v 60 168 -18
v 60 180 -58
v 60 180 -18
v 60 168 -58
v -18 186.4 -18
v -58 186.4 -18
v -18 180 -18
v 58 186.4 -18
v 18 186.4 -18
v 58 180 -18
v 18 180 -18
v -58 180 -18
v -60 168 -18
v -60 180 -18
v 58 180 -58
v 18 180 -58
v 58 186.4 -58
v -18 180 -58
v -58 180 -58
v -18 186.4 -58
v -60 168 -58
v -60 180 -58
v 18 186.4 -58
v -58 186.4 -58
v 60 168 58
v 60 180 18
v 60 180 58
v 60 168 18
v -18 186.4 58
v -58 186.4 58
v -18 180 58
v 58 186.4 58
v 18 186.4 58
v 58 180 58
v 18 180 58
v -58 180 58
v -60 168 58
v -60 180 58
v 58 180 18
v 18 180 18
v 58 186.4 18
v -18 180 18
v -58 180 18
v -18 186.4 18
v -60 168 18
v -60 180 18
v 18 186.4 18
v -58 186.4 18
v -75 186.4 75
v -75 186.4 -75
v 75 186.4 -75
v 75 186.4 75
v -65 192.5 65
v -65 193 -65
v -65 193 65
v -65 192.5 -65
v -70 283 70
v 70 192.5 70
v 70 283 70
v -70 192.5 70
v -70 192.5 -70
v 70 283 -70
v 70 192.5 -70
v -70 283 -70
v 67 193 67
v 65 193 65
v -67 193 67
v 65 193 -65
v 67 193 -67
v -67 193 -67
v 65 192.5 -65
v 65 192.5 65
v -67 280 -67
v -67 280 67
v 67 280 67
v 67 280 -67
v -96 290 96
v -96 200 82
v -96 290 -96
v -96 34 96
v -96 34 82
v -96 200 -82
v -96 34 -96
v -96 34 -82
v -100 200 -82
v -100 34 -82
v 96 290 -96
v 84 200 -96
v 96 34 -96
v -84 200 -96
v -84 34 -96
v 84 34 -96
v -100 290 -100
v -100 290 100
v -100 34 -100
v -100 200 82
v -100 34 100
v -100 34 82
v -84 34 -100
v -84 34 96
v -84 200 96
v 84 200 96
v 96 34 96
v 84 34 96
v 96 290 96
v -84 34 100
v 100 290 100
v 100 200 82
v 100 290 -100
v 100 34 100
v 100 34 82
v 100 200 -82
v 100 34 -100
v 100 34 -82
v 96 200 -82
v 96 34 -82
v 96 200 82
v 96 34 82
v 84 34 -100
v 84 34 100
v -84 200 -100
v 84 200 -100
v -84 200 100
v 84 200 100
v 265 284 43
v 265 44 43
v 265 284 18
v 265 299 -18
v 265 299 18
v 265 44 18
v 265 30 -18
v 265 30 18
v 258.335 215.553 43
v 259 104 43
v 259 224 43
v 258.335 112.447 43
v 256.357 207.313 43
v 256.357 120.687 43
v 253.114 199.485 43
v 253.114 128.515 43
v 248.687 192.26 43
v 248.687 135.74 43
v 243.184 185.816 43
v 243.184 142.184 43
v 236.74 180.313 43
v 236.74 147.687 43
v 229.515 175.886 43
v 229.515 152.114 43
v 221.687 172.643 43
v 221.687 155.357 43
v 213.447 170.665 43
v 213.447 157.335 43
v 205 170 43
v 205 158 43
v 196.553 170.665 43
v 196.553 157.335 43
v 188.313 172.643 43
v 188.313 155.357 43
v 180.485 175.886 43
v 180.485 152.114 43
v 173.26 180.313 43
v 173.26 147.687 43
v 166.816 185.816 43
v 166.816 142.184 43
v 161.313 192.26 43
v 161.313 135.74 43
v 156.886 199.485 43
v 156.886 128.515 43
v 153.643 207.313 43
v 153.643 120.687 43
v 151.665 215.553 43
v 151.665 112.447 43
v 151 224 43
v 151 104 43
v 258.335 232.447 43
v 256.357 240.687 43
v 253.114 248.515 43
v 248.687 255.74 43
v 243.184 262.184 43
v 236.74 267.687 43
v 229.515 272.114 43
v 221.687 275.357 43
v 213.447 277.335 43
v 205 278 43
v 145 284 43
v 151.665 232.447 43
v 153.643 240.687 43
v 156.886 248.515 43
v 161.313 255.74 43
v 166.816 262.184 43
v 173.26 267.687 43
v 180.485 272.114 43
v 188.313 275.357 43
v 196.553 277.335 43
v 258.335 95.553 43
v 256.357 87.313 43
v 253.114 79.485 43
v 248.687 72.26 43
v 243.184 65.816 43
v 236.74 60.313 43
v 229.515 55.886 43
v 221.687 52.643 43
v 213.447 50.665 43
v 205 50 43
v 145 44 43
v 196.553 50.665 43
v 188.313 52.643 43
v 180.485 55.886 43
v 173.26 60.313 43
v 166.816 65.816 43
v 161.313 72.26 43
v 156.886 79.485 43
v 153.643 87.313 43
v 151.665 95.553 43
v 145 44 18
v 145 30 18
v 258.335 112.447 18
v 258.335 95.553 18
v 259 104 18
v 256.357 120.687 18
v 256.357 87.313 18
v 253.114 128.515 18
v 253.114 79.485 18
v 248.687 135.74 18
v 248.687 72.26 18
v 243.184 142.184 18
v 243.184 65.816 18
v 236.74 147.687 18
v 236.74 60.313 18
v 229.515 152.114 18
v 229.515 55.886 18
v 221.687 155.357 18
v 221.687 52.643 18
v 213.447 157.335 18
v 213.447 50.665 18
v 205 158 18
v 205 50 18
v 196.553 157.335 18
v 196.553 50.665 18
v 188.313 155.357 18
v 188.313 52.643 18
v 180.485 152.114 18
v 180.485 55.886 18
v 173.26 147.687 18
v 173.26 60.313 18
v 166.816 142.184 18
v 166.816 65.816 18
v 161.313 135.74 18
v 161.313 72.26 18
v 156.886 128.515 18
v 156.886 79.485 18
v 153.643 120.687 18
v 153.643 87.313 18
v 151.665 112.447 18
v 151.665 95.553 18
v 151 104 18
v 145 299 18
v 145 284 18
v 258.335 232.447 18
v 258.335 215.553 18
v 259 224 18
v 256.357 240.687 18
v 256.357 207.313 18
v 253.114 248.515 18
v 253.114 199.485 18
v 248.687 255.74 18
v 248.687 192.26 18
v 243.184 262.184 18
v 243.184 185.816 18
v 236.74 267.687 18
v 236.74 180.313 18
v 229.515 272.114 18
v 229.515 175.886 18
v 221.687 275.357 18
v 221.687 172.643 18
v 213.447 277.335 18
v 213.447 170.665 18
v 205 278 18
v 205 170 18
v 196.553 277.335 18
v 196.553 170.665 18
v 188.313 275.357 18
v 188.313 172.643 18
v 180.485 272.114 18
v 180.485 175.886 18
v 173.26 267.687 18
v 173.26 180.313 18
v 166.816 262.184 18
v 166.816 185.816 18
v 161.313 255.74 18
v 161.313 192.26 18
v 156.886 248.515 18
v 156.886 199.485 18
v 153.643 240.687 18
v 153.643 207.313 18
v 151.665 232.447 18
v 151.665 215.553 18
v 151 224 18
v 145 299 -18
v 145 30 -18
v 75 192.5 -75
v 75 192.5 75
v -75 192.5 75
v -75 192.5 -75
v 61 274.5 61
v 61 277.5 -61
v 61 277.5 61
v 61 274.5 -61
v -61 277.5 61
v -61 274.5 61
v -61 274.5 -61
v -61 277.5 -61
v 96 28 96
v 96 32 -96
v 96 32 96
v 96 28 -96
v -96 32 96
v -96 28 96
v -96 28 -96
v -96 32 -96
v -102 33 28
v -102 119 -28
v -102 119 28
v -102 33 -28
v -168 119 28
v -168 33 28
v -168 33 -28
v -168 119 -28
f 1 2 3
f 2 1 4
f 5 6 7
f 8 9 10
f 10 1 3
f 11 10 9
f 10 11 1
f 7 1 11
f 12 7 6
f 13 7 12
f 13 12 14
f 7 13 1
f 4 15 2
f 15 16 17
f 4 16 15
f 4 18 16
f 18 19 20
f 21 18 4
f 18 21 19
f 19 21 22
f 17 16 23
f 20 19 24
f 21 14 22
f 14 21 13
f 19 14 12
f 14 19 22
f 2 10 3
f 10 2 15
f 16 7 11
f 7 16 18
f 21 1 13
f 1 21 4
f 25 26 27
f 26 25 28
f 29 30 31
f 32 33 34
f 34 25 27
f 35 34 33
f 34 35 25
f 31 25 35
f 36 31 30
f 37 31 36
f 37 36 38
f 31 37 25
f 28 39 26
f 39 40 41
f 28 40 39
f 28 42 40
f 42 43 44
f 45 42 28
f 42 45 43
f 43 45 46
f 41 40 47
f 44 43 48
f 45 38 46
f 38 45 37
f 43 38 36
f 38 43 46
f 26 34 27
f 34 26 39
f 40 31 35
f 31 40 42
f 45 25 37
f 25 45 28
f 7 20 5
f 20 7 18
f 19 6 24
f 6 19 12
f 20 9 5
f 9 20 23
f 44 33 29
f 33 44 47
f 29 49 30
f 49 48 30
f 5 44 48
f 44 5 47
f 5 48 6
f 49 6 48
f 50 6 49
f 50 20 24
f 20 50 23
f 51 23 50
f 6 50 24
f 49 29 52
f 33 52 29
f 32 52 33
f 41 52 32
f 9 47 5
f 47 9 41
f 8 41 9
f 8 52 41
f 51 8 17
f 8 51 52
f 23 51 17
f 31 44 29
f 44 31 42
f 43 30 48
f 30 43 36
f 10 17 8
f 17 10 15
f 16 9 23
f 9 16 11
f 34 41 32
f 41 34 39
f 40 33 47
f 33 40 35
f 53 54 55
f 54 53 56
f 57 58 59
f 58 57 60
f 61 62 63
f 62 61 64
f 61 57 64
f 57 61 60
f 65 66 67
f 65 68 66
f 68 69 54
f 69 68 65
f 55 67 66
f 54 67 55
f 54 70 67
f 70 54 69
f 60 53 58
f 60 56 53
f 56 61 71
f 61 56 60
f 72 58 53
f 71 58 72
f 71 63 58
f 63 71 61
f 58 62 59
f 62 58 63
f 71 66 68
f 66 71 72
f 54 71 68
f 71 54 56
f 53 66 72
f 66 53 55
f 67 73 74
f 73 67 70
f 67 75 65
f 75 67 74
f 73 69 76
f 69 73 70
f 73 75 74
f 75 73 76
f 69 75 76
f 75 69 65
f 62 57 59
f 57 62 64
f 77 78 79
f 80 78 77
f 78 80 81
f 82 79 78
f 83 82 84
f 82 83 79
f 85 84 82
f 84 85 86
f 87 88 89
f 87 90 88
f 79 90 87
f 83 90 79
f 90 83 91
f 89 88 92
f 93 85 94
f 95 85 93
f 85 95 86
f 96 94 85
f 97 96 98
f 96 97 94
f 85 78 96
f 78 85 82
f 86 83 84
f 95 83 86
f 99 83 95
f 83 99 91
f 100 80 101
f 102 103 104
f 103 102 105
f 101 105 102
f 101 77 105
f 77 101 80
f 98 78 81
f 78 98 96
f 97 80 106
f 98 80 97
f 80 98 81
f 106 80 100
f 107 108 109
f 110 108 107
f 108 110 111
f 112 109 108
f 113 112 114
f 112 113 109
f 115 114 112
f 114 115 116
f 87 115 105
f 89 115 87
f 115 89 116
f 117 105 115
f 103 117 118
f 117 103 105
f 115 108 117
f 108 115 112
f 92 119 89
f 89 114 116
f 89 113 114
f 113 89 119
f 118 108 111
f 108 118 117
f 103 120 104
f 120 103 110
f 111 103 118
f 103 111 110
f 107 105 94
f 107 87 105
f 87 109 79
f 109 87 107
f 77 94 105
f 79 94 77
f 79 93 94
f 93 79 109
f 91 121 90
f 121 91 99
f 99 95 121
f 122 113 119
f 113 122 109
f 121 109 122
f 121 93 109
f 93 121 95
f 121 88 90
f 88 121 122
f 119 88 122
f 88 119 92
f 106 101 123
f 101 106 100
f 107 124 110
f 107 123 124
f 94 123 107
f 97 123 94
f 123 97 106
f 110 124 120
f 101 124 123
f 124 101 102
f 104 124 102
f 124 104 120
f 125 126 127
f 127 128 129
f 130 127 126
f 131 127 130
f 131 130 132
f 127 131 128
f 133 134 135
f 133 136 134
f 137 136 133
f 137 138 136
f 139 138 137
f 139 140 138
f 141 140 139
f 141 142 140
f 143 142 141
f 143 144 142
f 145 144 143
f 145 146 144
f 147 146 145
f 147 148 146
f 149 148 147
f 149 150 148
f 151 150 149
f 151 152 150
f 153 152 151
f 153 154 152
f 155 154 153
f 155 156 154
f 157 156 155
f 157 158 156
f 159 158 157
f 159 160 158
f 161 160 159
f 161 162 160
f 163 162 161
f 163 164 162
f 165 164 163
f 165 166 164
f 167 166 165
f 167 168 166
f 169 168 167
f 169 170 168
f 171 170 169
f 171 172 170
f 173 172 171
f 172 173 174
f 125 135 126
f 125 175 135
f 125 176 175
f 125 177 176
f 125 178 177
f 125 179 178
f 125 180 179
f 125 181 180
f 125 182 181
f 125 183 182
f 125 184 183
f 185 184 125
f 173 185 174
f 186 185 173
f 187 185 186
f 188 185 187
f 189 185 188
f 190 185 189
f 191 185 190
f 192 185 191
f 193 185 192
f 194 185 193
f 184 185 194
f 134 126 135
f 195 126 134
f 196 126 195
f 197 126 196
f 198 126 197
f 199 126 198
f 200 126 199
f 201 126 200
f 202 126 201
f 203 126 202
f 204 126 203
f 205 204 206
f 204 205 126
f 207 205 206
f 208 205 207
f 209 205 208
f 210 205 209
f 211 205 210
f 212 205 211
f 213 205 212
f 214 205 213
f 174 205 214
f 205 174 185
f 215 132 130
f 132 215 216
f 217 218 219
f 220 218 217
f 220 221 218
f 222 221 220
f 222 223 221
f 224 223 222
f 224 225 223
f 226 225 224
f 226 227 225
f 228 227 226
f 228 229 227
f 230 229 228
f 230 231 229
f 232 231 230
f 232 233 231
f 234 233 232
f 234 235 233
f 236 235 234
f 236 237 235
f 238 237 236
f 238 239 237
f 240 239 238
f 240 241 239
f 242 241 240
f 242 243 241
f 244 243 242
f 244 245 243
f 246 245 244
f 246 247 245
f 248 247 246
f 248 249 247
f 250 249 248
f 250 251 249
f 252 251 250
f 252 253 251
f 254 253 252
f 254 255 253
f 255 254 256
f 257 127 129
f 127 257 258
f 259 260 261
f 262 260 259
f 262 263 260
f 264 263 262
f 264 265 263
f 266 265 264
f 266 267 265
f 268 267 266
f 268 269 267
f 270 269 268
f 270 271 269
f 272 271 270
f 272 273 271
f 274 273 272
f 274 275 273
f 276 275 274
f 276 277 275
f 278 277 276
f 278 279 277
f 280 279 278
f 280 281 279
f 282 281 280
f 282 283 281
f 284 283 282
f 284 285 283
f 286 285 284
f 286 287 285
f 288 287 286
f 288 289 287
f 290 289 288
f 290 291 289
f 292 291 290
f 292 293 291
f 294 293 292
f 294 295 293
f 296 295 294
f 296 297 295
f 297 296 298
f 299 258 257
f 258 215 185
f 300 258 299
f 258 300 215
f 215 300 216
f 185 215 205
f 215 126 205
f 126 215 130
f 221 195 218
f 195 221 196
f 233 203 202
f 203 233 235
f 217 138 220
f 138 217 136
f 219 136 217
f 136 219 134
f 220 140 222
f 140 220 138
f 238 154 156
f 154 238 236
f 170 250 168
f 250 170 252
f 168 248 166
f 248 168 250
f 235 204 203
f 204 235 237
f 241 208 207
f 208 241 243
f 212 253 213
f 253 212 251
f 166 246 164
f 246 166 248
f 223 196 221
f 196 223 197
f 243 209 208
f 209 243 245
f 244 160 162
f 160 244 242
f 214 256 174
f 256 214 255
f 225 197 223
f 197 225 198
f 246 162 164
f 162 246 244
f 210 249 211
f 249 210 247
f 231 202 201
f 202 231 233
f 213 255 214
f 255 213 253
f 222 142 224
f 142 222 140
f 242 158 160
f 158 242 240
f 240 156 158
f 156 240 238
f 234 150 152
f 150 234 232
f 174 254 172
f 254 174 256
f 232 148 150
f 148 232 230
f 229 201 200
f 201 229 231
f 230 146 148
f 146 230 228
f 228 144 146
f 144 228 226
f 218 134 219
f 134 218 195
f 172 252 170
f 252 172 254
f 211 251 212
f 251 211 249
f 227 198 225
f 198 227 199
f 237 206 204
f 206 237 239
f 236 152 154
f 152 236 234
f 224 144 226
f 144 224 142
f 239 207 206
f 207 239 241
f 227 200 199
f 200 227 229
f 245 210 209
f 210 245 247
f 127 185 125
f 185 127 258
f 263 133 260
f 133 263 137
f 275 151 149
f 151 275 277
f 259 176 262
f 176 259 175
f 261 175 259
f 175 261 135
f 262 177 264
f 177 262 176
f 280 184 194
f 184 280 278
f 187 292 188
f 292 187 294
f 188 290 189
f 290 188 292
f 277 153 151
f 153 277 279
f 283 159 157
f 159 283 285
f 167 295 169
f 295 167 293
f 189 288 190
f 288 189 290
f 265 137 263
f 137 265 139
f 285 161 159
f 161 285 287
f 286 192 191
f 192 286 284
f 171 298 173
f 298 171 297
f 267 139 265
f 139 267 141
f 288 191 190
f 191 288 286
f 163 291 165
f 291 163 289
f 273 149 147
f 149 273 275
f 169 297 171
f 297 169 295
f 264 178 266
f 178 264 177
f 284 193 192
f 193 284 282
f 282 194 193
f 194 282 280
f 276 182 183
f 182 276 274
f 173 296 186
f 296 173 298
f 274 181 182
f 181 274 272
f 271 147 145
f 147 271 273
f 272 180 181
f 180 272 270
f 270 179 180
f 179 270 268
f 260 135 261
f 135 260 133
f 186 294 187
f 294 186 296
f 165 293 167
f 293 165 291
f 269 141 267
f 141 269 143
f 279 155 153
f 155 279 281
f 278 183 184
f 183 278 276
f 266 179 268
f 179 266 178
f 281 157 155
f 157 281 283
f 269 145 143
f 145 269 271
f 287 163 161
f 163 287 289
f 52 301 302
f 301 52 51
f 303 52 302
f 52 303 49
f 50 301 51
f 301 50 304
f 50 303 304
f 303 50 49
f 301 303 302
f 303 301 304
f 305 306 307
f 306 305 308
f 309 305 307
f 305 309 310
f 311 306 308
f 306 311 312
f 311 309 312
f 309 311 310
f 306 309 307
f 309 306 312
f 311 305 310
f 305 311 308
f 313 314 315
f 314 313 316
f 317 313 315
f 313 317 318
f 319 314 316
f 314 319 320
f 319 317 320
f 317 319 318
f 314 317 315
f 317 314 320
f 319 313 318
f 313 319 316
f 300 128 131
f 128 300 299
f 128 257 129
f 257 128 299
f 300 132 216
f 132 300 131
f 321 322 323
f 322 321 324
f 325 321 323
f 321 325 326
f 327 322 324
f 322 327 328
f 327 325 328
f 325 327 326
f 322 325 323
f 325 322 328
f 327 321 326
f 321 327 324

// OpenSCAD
// Four-module water-cooled concept assembly. mm. Not fabrication-ready.
// Body dimensions from sources.json; fittings and mounting are approximate.
exploded=0; $fn=40; sep=exploded*28;
module block(w,h,d,x,y,z){translate([x-w/2,y-h/2,z-d/2])cube([w,h,d]);}
color("gray")for(z=[-38,38])block(120,12,40,0,174,z);
color("white")for(x=[-38,38])for(z=[-38,38])block(40,6.4,40,x,183.2+sep,z);
color("peru")block(150,6,150,0,189.4+2*sep,0);
color("black")block(150,.1,150,0,192.45+2*sep,0);
color("white"){
 for(x=[-67.5,67.5])block(5,.5,140,x,192.75+3*sep,0);
 for(z=[-67.5,67.5])block(130,.5,5,0,192.75+3*sep,z);
}
color("lightblue",.18){
 for(x=[-68.5,68.5])block(3,87,134,x,236.5+4*sep,0);
 for(z=[-68.5,68.5])block(140,87,3,0,236.5+4*sep,z);
 block(140,3,140,0,281.5+4*sep,0);
}
color("beige")block(122,3,122,0,276+4*sep,0);
color("lightblue",.1){
 for(x=[-98,98]){block(4,90,192,x,245,0);for(z=[-89,89])block(4,166,14,x,117,z);}
 for(z=[-98,98]){block(200,90,4,0,245,z);for(x=[-92,92])block(16,166,4,x,117,z);}
}
color("black")block(192,4,192,0,30,0);
// External AS240, and two P12 fans (simple dimensional envelopes).
color("dimgray")block(120,269,36,205,164.5,0);
color("black")for(y=[104,224])difference(){block(120,120,25,205,y,30.5);translate([205,y,15])cylinder(r=54,h=35);}
color("lightblue",.3)block(66,62,56,-135,88,0);
color("black")block(66,24,56,-135,45,0);
// Hose paths, clamps, block supports and electrical equipment are not CAD releases.
